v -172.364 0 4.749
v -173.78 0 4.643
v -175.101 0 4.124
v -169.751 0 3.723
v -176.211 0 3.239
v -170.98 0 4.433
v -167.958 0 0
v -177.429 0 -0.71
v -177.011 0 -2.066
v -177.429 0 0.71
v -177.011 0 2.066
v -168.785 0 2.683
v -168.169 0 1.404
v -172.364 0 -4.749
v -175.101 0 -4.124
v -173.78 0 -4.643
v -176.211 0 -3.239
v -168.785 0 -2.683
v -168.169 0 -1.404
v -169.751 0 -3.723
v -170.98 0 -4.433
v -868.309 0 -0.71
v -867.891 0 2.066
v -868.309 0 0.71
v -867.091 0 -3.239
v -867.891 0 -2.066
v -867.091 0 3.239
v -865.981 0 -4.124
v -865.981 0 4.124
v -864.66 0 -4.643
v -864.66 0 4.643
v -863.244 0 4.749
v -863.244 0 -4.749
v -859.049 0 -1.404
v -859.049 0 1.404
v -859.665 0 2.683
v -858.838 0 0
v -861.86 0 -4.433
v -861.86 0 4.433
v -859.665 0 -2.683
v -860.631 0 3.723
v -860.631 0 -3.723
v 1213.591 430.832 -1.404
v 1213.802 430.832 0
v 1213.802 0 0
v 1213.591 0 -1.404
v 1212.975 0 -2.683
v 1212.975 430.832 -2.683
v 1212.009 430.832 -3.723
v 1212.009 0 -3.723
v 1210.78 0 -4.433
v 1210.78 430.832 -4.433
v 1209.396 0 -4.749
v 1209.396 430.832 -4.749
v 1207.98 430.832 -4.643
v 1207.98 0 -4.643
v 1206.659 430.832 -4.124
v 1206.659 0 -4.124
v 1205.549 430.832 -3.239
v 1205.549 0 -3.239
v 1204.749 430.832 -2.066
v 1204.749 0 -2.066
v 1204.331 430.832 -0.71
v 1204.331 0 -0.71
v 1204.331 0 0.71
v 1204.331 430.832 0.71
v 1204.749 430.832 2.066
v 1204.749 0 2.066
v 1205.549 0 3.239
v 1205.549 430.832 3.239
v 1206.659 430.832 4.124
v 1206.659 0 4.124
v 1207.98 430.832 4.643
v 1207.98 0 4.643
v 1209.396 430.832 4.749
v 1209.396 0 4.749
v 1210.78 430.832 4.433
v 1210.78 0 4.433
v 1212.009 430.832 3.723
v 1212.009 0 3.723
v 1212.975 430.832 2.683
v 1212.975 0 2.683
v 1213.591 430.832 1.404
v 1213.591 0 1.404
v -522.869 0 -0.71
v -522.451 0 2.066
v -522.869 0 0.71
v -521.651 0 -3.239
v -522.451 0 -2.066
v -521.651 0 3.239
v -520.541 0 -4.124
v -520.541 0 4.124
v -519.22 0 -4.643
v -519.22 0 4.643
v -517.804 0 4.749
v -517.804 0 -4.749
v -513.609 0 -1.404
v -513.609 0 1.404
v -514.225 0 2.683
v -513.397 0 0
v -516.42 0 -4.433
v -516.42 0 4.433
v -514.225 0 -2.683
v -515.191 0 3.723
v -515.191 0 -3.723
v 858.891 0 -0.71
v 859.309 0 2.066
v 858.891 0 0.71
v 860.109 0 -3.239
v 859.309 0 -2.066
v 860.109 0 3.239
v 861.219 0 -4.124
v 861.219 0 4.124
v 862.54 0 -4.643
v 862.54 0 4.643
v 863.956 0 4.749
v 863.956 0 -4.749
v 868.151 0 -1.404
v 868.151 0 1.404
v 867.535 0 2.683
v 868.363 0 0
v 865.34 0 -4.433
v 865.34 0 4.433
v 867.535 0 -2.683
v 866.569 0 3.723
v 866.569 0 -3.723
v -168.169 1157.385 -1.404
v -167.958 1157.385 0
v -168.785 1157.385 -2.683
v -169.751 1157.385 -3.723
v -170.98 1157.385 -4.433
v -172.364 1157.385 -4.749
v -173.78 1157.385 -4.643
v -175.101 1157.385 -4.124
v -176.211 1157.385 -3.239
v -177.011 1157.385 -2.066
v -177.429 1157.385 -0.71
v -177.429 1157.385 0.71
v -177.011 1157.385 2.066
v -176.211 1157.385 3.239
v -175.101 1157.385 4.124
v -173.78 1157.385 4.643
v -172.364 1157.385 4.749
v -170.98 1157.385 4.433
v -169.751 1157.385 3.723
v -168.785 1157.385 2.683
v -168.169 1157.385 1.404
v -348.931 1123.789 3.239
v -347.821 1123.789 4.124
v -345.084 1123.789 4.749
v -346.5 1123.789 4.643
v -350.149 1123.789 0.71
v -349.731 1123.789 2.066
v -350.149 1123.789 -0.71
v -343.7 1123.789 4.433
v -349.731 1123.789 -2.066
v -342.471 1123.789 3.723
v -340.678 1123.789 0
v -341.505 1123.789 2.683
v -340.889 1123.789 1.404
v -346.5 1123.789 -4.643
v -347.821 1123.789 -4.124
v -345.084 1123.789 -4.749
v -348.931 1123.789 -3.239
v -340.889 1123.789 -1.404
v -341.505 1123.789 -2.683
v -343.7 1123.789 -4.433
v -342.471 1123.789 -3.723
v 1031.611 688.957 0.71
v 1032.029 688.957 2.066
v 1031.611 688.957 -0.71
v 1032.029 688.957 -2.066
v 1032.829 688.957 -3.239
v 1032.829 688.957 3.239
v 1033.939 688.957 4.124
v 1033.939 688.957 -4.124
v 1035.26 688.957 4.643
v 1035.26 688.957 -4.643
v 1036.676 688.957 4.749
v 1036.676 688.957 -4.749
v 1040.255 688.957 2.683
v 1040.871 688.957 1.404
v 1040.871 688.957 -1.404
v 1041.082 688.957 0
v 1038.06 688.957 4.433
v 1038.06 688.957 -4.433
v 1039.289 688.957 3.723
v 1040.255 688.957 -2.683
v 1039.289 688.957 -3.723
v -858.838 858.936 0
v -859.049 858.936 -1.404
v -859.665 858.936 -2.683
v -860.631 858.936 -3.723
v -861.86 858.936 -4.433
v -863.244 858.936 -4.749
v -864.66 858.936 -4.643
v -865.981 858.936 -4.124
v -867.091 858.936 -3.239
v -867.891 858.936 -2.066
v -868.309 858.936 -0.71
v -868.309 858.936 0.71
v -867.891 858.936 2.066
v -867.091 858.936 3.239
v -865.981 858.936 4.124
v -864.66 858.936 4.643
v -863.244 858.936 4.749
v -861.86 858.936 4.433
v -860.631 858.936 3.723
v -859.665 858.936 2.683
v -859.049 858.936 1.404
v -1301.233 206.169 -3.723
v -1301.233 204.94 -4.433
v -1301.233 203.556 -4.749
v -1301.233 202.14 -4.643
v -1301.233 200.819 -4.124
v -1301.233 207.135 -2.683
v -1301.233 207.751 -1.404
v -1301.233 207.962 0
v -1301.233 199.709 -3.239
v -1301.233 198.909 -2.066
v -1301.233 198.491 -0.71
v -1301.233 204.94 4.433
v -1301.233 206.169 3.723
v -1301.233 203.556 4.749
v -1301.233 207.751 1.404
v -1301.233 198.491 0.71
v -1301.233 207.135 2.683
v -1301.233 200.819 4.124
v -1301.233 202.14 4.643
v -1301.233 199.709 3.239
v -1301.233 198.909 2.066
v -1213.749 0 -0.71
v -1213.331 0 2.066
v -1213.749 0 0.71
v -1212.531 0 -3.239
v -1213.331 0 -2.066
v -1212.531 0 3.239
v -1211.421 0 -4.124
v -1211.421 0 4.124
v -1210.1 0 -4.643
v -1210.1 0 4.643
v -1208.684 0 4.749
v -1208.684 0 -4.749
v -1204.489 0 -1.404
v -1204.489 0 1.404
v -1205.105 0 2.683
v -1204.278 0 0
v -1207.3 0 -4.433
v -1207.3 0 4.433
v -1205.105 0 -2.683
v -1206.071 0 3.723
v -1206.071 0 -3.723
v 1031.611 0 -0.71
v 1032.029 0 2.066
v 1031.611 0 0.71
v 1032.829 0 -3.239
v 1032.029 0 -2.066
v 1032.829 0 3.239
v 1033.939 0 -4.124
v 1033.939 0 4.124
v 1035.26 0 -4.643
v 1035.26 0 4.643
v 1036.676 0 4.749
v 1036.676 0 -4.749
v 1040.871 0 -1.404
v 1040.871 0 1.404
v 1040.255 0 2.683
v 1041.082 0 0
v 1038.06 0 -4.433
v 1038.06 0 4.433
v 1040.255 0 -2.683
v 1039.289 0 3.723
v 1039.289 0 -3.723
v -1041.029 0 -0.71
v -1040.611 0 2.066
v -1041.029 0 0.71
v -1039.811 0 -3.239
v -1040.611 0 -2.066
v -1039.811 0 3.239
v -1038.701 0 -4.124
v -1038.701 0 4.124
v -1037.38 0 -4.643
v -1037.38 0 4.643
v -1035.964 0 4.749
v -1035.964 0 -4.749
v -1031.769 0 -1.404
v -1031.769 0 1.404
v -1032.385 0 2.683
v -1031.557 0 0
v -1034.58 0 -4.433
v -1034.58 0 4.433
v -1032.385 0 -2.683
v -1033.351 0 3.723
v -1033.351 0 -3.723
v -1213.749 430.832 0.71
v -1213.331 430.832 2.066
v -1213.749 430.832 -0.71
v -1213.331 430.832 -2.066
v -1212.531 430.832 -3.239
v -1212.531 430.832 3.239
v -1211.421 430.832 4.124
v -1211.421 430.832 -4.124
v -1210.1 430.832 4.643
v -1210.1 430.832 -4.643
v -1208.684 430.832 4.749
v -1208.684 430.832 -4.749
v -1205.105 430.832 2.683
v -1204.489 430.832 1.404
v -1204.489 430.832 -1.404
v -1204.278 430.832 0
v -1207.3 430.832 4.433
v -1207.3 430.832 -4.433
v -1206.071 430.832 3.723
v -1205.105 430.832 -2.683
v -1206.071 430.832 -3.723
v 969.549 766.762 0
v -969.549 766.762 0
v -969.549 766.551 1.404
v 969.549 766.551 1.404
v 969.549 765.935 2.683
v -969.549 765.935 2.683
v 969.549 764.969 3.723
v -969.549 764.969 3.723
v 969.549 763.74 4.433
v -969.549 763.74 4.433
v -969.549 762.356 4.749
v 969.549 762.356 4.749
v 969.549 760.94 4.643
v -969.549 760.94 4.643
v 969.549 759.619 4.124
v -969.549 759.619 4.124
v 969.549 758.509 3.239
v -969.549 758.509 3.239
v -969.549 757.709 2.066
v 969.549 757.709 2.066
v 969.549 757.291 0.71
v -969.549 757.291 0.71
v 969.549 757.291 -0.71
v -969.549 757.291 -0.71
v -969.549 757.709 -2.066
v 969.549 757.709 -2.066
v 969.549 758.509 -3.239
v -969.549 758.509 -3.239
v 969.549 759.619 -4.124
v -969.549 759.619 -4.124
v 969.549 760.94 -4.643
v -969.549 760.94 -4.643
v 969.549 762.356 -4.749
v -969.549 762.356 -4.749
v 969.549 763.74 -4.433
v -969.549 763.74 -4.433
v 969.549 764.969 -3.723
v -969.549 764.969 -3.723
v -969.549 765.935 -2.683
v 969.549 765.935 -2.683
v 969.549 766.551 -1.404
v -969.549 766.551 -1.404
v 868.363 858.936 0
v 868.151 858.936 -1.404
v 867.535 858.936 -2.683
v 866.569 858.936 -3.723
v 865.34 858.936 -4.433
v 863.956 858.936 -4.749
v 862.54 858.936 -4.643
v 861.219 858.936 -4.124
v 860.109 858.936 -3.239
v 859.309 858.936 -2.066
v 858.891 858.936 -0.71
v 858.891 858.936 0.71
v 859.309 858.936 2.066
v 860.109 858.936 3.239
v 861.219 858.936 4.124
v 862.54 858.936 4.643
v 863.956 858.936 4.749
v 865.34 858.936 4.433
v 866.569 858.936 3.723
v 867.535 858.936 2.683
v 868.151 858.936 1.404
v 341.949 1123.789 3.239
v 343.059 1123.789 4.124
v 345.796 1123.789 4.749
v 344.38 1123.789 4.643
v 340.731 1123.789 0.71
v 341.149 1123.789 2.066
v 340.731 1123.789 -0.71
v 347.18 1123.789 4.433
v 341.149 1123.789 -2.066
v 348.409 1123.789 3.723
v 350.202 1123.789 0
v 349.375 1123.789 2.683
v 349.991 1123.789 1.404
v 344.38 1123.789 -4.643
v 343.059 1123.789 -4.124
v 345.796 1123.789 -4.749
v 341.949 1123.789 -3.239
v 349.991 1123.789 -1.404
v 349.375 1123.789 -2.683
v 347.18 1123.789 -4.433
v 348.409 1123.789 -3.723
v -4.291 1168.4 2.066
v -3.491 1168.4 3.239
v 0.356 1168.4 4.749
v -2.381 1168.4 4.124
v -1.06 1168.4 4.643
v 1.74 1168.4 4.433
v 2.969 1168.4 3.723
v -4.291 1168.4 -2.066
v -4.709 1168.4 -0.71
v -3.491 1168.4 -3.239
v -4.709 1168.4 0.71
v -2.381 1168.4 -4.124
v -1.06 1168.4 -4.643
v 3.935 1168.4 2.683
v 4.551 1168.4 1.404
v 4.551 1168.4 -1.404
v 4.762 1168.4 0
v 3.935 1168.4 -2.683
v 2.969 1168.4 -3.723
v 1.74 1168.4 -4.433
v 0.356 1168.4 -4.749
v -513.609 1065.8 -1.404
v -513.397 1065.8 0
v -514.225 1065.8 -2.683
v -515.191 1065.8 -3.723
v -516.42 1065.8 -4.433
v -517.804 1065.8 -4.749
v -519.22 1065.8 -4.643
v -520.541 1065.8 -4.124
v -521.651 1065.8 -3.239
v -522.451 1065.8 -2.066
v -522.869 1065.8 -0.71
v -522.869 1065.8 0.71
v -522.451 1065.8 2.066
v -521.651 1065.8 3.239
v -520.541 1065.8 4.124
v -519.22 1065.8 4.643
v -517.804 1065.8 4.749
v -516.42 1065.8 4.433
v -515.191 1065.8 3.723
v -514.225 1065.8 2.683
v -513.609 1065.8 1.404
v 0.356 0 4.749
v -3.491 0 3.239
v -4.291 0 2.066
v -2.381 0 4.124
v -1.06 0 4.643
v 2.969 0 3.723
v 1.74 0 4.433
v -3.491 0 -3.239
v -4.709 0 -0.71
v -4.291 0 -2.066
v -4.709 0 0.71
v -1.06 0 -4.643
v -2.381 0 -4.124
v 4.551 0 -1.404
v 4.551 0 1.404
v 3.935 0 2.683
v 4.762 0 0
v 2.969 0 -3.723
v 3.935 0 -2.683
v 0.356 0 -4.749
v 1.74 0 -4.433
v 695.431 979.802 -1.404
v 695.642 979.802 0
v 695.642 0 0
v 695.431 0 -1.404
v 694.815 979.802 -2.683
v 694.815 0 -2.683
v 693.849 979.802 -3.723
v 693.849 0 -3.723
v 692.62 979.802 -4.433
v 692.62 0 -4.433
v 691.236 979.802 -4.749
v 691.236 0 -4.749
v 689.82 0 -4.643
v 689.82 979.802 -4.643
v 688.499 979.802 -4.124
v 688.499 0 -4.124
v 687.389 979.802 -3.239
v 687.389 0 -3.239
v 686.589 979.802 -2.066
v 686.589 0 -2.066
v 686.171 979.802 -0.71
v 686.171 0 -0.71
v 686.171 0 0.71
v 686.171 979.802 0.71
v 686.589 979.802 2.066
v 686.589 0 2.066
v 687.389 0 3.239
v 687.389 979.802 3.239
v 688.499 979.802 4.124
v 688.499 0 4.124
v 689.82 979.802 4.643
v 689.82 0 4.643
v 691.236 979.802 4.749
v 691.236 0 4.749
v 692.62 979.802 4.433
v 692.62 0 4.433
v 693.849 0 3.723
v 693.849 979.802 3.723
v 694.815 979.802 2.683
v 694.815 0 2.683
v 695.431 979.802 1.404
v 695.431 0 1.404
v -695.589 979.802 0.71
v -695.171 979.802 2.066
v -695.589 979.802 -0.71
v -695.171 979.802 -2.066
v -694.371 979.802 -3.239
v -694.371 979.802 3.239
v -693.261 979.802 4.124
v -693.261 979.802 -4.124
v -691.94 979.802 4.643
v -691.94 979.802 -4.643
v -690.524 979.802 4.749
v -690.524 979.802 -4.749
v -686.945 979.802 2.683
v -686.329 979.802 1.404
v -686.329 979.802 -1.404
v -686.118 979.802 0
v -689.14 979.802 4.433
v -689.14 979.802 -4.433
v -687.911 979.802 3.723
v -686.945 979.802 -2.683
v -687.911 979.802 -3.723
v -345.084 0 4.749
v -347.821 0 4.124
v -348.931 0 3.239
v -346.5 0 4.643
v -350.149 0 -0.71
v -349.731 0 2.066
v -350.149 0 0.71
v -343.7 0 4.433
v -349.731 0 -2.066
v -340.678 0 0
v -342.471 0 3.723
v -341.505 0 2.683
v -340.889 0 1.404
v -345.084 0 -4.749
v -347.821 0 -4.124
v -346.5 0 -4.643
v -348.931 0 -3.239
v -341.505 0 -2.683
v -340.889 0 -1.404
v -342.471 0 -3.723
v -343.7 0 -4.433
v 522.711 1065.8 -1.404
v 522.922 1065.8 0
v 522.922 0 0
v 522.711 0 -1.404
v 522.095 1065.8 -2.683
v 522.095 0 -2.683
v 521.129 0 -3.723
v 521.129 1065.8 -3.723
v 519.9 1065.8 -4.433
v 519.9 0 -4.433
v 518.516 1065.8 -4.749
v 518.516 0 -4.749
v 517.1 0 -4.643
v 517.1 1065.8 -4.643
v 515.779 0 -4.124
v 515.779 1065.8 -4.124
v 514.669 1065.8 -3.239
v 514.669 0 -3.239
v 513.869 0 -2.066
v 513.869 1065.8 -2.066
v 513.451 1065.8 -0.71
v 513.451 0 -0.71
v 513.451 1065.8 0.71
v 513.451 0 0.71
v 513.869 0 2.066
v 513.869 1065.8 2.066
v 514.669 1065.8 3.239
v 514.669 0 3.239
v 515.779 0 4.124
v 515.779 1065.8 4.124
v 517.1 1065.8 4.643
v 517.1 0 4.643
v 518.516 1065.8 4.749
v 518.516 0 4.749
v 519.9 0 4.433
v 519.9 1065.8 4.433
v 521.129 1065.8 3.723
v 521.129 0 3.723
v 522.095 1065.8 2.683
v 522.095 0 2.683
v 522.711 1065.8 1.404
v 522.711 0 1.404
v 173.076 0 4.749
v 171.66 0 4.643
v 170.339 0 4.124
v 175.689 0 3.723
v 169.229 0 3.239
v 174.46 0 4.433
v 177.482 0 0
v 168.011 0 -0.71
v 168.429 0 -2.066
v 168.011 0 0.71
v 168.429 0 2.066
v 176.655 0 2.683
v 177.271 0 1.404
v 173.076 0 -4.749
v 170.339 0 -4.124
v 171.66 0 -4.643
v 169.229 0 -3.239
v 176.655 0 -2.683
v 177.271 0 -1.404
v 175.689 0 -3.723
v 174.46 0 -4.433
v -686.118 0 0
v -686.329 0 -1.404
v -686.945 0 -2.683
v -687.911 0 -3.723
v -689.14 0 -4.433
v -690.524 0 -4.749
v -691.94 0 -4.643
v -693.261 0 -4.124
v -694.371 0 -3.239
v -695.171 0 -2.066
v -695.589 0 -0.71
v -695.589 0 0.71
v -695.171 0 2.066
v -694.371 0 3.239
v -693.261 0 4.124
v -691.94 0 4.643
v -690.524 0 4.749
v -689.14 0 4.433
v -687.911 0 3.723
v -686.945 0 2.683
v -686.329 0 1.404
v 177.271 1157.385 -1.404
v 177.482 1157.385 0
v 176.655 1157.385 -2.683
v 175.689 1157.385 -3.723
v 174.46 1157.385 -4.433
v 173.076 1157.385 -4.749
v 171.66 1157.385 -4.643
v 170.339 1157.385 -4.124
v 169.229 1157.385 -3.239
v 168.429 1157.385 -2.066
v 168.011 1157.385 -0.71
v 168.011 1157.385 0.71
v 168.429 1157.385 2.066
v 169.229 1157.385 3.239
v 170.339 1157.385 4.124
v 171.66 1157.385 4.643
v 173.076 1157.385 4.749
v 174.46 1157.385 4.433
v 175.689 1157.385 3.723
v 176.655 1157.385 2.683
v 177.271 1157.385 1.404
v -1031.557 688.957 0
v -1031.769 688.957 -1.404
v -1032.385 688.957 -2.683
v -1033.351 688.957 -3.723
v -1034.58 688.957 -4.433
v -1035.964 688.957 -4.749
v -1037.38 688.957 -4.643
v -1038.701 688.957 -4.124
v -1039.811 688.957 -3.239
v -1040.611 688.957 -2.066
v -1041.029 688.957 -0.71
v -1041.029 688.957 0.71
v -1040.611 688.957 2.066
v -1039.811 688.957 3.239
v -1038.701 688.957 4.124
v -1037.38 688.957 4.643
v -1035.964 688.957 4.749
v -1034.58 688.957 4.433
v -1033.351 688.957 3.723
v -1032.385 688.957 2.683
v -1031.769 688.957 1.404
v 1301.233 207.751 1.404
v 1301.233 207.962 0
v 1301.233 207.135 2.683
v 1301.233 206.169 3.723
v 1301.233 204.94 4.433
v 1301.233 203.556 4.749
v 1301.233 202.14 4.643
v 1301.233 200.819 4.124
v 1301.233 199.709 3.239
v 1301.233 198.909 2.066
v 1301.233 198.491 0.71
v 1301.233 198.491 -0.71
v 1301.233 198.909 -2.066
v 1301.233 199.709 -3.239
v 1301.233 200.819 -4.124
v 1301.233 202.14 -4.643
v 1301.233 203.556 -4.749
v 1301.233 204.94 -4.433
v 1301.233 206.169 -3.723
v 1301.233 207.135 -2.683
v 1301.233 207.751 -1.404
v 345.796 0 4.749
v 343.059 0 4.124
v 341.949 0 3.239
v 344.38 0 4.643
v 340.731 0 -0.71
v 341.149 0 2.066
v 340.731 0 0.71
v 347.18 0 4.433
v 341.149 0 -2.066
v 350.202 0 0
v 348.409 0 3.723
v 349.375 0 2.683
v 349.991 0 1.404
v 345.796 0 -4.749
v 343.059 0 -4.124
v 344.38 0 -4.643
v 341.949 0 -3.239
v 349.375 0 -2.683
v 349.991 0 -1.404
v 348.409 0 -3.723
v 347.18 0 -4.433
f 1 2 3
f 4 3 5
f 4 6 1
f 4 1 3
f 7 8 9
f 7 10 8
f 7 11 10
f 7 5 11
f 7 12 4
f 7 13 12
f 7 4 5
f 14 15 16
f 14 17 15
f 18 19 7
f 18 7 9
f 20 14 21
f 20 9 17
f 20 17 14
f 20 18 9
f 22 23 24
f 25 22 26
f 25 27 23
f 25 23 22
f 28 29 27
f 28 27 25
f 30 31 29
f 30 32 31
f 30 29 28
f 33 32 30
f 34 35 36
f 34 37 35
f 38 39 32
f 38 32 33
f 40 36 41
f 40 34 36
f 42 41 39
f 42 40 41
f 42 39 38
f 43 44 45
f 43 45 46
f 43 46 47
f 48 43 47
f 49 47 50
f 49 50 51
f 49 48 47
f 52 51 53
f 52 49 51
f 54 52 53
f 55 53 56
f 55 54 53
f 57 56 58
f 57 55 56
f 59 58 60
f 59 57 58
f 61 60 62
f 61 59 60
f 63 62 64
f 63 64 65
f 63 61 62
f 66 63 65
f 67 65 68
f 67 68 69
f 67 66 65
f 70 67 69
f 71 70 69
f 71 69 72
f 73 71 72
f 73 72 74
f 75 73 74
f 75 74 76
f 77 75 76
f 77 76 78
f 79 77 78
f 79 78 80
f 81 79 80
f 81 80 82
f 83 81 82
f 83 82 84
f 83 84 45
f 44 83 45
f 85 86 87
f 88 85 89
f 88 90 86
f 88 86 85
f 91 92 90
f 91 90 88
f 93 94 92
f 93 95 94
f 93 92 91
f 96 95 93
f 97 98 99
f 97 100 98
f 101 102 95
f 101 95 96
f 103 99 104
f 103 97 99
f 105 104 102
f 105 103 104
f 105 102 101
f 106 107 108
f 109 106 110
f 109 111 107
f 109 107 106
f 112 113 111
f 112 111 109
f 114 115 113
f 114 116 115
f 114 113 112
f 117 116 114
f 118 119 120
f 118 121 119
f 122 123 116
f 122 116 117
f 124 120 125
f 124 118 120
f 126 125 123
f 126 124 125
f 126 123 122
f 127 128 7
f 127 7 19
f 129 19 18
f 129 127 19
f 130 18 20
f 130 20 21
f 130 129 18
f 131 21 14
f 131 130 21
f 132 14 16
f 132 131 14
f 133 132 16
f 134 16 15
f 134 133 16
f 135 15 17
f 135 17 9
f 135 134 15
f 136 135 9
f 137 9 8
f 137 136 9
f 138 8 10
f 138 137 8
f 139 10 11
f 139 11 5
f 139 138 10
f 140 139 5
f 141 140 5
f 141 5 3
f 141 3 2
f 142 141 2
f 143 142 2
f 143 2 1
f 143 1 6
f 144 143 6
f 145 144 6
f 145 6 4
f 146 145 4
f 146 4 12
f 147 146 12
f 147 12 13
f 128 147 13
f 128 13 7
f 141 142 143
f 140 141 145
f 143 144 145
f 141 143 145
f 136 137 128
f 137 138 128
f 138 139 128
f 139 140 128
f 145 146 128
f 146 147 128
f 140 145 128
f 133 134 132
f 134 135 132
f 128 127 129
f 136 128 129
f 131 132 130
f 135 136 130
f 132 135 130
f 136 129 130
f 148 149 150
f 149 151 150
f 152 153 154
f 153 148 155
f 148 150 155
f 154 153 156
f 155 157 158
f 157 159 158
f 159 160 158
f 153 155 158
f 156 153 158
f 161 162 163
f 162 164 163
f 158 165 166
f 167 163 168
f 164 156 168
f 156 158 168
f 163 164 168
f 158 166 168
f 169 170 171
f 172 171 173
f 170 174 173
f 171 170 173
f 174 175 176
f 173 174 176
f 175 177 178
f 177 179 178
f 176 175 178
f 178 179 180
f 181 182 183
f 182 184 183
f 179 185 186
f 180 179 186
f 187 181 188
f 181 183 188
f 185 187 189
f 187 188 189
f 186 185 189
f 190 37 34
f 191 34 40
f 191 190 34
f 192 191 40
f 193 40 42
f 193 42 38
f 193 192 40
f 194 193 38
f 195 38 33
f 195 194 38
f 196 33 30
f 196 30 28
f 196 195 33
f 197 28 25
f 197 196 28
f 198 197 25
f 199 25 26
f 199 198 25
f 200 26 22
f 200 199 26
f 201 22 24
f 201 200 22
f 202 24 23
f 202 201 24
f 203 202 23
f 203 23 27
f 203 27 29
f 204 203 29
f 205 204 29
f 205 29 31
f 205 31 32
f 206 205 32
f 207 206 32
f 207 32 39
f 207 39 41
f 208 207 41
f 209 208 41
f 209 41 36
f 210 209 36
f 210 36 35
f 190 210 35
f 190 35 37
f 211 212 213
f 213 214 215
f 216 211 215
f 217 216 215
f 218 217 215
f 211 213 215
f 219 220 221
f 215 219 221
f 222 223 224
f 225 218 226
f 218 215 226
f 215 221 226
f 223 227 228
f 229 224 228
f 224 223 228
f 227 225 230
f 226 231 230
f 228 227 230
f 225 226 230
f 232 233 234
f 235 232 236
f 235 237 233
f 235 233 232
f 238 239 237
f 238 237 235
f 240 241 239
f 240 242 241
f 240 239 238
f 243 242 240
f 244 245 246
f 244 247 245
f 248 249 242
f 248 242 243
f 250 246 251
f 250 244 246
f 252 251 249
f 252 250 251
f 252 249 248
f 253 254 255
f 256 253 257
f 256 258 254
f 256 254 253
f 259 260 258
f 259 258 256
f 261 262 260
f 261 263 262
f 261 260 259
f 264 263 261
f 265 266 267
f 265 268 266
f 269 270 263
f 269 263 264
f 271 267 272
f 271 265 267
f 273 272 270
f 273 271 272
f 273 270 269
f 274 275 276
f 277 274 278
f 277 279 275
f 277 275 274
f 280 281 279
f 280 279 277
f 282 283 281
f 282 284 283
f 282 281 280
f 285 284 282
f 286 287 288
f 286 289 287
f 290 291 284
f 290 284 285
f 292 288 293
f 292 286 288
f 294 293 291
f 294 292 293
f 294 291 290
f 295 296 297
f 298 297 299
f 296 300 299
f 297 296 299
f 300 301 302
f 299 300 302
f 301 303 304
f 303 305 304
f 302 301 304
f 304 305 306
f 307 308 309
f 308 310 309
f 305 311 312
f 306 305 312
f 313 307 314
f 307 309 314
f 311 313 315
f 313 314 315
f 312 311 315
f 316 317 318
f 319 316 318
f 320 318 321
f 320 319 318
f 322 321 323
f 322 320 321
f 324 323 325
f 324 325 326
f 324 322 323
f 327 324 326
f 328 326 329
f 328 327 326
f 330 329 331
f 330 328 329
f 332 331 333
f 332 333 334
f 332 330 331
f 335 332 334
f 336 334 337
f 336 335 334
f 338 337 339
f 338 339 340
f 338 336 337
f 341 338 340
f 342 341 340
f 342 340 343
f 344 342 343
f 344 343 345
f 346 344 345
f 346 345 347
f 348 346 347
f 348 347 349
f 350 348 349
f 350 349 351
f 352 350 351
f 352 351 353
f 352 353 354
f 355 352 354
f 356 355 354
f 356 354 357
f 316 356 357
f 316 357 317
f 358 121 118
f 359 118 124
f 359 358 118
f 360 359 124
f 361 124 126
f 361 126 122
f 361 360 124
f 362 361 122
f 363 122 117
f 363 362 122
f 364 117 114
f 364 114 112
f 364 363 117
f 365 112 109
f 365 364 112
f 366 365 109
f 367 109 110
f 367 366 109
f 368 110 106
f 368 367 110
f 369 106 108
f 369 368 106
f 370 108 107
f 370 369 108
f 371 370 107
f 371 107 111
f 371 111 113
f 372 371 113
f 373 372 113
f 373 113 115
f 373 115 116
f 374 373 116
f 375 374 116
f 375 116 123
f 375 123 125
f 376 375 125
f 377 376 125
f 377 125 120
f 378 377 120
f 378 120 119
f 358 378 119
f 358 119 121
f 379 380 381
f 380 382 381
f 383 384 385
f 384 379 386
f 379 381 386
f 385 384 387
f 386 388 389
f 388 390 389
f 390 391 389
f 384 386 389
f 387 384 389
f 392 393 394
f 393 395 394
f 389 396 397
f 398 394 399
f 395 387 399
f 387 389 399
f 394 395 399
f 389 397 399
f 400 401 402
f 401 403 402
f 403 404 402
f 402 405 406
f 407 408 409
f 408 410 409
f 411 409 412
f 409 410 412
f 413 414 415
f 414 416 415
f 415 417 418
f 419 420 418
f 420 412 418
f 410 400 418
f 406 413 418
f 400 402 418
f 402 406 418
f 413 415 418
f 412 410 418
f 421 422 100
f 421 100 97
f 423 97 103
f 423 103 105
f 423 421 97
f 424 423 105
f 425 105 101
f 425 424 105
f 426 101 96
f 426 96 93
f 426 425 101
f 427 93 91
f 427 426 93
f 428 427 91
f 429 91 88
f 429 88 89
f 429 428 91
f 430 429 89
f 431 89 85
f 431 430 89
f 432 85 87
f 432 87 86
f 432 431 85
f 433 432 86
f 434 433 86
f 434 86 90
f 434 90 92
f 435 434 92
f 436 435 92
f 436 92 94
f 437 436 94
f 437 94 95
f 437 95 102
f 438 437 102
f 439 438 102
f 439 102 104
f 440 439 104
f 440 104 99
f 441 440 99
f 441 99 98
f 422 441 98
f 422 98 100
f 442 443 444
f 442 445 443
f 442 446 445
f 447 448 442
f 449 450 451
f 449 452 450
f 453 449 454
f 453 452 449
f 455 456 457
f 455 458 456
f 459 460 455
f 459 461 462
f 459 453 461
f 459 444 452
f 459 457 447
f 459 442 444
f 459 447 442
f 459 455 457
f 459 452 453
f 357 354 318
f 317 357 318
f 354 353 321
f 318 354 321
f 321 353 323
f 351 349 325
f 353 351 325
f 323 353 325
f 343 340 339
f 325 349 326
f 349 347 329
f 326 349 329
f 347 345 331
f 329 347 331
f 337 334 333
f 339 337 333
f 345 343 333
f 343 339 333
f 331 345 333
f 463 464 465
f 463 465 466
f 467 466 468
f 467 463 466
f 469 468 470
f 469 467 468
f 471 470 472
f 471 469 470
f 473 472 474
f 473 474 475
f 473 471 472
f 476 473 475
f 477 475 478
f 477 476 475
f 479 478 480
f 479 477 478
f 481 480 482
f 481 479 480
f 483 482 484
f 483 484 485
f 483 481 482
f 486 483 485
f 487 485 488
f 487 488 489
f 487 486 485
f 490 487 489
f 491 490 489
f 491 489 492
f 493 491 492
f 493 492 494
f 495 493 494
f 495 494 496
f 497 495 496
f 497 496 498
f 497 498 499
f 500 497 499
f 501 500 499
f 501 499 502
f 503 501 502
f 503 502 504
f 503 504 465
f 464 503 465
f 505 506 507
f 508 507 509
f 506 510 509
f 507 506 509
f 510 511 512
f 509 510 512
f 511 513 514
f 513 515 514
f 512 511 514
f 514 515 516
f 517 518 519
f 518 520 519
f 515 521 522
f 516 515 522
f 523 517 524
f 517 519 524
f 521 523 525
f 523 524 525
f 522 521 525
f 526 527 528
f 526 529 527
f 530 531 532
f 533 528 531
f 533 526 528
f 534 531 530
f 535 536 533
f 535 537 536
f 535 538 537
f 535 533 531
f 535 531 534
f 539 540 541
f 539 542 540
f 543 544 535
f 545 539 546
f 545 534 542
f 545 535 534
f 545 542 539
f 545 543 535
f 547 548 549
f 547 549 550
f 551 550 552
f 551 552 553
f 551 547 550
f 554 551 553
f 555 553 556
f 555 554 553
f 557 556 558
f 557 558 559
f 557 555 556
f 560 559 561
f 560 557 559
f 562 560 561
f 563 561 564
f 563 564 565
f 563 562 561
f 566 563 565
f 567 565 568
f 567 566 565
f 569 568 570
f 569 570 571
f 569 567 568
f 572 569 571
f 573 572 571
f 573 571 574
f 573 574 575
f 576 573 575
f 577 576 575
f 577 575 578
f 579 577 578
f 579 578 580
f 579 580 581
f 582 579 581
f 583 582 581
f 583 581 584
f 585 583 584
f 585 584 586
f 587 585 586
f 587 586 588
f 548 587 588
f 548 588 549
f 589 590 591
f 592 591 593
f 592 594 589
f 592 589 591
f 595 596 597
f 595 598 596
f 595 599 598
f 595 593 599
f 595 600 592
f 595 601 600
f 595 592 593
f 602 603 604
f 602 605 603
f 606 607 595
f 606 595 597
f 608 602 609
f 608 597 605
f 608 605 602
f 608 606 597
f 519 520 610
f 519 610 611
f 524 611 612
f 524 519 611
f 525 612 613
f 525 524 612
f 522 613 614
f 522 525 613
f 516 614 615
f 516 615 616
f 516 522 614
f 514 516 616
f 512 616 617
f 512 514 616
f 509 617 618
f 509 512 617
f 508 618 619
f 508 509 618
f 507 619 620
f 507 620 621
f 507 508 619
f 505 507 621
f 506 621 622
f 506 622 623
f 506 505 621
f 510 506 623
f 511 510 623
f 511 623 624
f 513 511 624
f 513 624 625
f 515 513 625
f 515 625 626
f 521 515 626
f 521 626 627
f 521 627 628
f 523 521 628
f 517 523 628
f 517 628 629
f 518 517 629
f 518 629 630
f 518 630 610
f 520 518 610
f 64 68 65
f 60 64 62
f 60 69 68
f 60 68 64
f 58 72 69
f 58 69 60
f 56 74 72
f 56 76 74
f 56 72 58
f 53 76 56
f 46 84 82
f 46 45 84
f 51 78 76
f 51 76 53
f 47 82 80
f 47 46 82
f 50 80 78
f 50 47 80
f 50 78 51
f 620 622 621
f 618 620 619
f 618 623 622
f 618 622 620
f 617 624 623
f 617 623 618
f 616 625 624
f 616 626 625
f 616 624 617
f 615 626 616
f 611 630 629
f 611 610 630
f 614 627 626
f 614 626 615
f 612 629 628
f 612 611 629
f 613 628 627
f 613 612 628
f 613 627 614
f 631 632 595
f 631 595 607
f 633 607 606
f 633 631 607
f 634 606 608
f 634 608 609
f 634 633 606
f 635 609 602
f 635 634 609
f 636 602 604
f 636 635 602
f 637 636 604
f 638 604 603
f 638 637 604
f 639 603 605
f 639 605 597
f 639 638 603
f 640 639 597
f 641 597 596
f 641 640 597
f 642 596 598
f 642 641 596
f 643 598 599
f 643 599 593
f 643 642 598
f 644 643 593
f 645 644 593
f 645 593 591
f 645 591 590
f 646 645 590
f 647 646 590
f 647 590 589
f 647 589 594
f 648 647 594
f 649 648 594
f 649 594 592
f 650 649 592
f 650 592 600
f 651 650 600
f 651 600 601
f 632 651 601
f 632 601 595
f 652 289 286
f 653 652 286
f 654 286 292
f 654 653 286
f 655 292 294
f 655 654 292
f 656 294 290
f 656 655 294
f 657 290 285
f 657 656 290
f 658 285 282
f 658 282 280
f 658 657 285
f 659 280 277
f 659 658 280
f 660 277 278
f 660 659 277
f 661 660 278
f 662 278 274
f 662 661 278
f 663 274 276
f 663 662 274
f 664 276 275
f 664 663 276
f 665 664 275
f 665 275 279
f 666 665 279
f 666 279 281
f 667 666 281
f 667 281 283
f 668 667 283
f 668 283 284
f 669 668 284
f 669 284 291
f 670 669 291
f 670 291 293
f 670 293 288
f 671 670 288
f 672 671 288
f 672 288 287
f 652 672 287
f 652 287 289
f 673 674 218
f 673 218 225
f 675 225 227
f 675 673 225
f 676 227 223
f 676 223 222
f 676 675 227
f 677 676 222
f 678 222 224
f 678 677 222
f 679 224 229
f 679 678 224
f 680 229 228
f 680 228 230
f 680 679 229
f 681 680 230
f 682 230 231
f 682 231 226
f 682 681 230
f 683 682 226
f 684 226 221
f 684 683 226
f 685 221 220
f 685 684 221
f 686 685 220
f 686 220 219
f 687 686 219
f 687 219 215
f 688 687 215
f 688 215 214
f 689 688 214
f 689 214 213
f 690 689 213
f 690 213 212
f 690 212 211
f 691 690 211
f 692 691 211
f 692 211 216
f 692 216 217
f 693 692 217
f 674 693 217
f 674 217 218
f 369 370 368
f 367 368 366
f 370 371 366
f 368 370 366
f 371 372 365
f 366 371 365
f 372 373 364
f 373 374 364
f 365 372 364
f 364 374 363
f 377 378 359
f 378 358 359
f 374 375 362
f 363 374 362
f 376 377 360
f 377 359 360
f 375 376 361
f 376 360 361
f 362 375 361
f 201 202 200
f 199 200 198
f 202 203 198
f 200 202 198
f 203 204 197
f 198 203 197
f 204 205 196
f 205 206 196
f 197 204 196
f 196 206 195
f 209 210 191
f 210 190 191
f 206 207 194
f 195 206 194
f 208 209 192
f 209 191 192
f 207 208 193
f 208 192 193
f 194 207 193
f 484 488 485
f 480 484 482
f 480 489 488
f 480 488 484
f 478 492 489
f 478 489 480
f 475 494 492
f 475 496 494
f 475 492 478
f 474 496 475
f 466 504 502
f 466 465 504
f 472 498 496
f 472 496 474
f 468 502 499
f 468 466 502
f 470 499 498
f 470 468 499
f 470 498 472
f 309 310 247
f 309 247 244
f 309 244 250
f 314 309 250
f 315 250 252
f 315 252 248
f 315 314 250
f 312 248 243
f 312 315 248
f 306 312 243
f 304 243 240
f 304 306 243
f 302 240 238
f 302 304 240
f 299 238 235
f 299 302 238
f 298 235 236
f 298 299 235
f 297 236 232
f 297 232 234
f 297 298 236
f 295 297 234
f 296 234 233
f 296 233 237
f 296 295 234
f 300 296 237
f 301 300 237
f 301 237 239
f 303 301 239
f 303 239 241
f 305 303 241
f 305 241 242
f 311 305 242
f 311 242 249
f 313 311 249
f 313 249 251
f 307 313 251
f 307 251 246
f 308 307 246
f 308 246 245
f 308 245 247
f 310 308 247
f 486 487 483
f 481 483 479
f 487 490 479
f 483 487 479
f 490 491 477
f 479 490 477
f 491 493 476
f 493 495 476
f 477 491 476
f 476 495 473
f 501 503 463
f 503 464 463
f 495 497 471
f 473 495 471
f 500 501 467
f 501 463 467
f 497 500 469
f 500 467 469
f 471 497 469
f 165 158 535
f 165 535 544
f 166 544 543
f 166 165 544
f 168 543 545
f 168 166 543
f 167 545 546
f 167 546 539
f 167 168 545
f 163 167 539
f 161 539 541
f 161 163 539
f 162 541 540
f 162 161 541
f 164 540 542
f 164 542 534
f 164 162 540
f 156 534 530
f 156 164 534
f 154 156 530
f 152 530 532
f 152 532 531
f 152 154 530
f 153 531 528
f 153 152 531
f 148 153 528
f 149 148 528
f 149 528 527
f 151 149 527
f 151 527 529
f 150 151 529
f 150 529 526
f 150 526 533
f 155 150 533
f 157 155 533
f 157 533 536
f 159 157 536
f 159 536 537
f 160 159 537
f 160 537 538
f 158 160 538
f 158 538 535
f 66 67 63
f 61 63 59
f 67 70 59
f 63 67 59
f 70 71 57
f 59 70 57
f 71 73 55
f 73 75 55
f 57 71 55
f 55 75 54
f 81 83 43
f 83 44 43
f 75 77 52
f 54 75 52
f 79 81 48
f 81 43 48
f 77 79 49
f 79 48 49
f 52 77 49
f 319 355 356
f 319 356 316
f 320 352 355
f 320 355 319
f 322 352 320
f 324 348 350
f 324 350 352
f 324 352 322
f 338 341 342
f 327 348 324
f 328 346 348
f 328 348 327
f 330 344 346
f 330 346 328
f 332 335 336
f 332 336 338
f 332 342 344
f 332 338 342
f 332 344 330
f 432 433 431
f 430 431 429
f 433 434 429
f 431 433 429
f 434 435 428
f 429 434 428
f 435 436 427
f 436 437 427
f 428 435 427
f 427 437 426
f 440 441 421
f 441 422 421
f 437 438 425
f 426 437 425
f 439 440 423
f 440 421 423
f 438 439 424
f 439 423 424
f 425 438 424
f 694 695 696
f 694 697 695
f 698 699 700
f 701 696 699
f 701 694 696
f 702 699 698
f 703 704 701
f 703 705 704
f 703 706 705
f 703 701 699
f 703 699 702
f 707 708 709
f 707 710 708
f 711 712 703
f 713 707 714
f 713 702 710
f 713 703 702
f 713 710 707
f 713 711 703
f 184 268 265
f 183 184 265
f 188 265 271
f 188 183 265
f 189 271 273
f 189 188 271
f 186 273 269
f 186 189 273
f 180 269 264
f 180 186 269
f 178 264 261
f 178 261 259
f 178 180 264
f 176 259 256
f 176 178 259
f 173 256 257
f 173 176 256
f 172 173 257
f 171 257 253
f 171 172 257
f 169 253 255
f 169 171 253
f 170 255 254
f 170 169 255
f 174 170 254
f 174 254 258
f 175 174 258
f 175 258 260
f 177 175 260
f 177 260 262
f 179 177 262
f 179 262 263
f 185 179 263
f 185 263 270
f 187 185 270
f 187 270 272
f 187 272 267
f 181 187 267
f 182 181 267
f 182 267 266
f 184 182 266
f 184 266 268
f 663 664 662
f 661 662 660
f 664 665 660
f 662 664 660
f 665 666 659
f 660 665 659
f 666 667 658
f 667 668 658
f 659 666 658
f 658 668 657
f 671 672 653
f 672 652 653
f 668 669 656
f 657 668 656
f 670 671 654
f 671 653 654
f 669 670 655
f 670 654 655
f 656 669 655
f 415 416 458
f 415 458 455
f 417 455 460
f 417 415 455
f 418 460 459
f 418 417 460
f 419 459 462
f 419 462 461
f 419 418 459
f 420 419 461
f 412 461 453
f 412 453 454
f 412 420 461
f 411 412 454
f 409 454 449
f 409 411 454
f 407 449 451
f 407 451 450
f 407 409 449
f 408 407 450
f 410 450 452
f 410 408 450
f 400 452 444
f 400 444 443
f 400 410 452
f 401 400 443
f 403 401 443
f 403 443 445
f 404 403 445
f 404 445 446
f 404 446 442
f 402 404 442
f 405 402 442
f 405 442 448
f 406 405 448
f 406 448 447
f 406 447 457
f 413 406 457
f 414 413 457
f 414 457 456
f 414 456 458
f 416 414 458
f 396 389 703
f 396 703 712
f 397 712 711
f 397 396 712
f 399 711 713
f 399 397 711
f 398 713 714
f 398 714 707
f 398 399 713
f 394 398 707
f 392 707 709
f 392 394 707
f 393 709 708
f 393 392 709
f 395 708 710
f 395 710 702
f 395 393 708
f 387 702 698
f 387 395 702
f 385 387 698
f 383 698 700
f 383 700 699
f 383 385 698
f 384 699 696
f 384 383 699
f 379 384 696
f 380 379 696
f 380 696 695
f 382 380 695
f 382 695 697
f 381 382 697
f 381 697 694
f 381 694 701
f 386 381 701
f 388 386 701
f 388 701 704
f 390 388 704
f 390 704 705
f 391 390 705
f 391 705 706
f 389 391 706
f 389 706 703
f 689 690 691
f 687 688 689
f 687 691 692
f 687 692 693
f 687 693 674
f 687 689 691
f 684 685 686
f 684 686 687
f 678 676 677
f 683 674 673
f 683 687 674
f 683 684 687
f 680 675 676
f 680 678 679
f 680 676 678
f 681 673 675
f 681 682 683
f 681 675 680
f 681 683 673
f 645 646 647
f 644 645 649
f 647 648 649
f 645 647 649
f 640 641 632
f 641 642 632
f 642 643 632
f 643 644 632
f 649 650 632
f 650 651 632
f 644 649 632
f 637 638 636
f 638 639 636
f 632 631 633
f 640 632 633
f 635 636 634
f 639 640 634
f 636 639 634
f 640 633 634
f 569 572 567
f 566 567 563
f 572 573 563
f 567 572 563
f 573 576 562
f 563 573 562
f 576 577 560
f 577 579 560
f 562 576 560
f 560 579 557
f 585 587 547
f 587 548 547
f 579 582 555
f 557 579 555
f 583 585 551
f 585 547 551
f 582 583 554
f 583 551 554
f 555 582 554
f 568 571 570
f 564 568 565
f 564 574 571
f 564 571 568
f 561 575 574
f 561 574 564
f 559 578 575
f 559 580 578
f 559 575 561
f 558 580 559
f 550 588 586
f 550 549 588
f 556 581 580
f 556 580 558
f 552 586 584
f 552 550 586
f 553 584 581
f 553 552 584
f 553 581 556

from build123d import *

# Parameters (mm, degrees)
F2_R  = 4.7625
F18_R = 4.7625


with BuildPart() as f3:
    # F3: sweep along a path in F0
    with BuildLine(Plane.XY) as f3_path:
        Line((-1209.04, 0), (-1209.04, 430.831865))
    # F2 (on Front) → F3 (sweep)
    with BuildSketch(Plane.XZ):
        with Locations((-1209.04, 0)):
            Circle(F2_R)
    sweep(path=f3_path.line)


with BuildPart() as f4:
    # F4: sweep along a path in F0
    with BuildLine(Plane.XY) as f4_path:
        Line((-1036.32, 0), (-1036.32, 688.956807))
    # F2 (on Front) → F4 (sweep)
    with BuildSketch(Plane.XZ):
        with Locations((-1036.32, 0)):
            Circle(F2_R)
    sweep(path=f4_path.line)


with BuildPart() as f5:
    # F5: sweep along a path in F0
    with BuildLine(Plane.XY) as f5_path:
        Line((-863.6, 0), (-863.6, 858.93646))
    # F2 (on Front) → F5 (sweep)
    with BuildSketch(Plane.XZ):
        with Locations((-863.6, 0)):
            Circle(F2_R)
    sweep(path=f5_path.line)


with BuildPart() as f6:
    # F6: sweep along a path in F0
    with BuildLine(Plane.XY) as f6_path:
        Line((-690.88, 0), (-690.88, 979.801864))
    # F2 (on Front) → F6 (sweep)
    with BuildSketch(Plane.XZ):
        with Locations((-690.88, 0)):
            Circle(F2_R)
    sweep(path=f6_path.line)


with BuildPart() as f7:
    # F7: sweep along a path in F0
    with BuildLine(Plane.XY) as f7_path:
        Line((-518.16, 0), (-518.16, 1065.799878))
    # F2 (on Front) → F7 (sweep)
    with BuildSketch(Plane.XZ):
        with Locations((-518.16, 0)):
            Circle(F2_R)
    sweep(path=f7_path.line)


with BuildPart() as f8:
    # F8: sweep along a path in F0
    with BuildLine(Plane.XY) as f8_path:
        Line((-345.44, 0), (-345.44, 1123.788521))
    # F2 (on Front) → F8 (sweep)
    with BuildSketch(Plane.XZ):
        with Locations((-345.44, 0)):
            Circle(F2_R)
    sweep(path=f8_path.line)


with BuildPart() as f9:
    # F9: sweep along a path in F0
    with BuildLine(Plane.XY) as f9_path:
        Line((-172.72, 0), (-172.72, 1157.385476))
    # F2 (on Front) → F9 (sweep)
    with BuildSketch(Plane.XZ):
        with Locations((-172.72, 0)):
            Circle(F2_R)
    sweep(path=f9_path.line)


with BuildPart() as f10:
    # F10: sweep along a path in F0
    with BuildLine(Plane.XY) as f10_path:
        Line((0, 0), (0, 1168.4))
    # F2 (on Front) → F10 (sweep)
    with BuildSketch(Plane.XZ):
        Circle(F2_R)
    sweep(path=f10_path.line)


with BuildPart() as f11:
    # F11: sweep along a path in F0
    with BuildLine(Plane.XY) as f11_path:
        Line((172.72, 0), (172.72, 1157.385476))
    # F2 (on Front) → F11 (sweep)
    with BuildSketch(Plane.XZ):
        with Locations((172.72, 0)):
            Circle(F2_R)
    sweep(path=f11_path.line)


with BuildPart() as f12:
    # F12: sweep along a path in F0
    with BuildLine(Plane.XY) as f12_path:
        Line((345.44, 0), (345.44, 1123.788521))
    # F2 (on Front) → F12 (sweep)
    with BuildSketch(Plane.XZ):
        with Locations((345.44, 0)):
            Circle(F2_R)
    sweep(path=f12_path.line)


with BuildPart() as f13:
    # F13: sweep along a path in F0
    with BuildLine(Plane.XY) as f13_path:
        Line((518.16, 0), (518.16, 1065.799878))
    # F2 (on Front) → F13 (sweep)
    with BuildSketch(Plane.XZ):
        with Locations((518.16, 0)):
            Circle(F2_R)
    sweep(path=f13_path.line)


with BuildPart() as f14:
    # F14: sweep along a path in F0
    with BuildLine(Plane.XY) as f14_path:
        Line((690.88, 0), (690.88, 979.801864))
    # F2 (on Front) → F14 (sweep)
    with BuildSketch(Plane.XZ):
        with Locations((690.88, 0)):
            Circle(F2_R)
    sweep(path=f14_path.line)


with BuildPart() as f15:
    # F15: sweep along a path in F0
    with BuildLine(Plane.XY) as f15_path:
        Line((863.6, 0), (863.6, 858.93646))
    # F2 (on Front) → F15 (sweep)
    with BuildSketch(Plane.XZ):
        with Locations((863.6, 0)):
            Circle(F2_R)
    sweep(path=f15_path.line)


with BuildPart() as f16:
    # F16: sweep along a path in F0
    with BuildLine(Plane.XY) as f16_path:
        Line((1036.32, 0), (1036.32, 688.956807))
    # F2 (on Front) → F16 (sweep)
    with BuildSketch(Plane.XZ):
        with Locations((1036.32, 0)):
            Circle(F2_R)
    sweep(path=f16_path.line)


with BuildPart() as f17:
    # F17: sweep along a path in F0
    with BuildLine(Plane.XY) as f17_path:
        Line((1209.04, 0), (1209.04, 430.831865))
    # F2 (on Front) → F17 (sweep)
    with BuildSketch(Plane.XZ):
        with Locations((1209.04, 0)):
            Circle(F2_R)
    sweep(path=f17_path.line)


with BuildPart() as f19:
    # F19: sweep along a path in F1
    with BuildLine(Plane.XY) as f19_path:
        Line((-969.549468, 762), (969.549468, 762))
    # F18 (on Right) → F19 (sweep)
    with BuildSketch(Plane.YZ):
        with Locations((762, 0)):
            Circle(F18_R)
    sweep(path=f19_path.line)


with BuildPart() as f20:
    # F20: sweep along a path in F1
    with BuildLine(Plane.XY) as f20_path:
        Line((-1301.233413, 203.2), (1301.233413, 203.2))
    # F18 (on Right) → F20 (sweep)
    with BuildSketch(Plane.YZ):
        with Locations((203.2, 0)):
            Circle(F18_R)
    sweep(path=f20_path.line)


solid = Compound([f3.part, f4.part, f5.part, f6.part, f7.part, f8.part, f9.part, f10.part, f11.part, f12.part, f13.part, f14.part, f15.part, f16.part, f17.part, f19.part, f20.part])
